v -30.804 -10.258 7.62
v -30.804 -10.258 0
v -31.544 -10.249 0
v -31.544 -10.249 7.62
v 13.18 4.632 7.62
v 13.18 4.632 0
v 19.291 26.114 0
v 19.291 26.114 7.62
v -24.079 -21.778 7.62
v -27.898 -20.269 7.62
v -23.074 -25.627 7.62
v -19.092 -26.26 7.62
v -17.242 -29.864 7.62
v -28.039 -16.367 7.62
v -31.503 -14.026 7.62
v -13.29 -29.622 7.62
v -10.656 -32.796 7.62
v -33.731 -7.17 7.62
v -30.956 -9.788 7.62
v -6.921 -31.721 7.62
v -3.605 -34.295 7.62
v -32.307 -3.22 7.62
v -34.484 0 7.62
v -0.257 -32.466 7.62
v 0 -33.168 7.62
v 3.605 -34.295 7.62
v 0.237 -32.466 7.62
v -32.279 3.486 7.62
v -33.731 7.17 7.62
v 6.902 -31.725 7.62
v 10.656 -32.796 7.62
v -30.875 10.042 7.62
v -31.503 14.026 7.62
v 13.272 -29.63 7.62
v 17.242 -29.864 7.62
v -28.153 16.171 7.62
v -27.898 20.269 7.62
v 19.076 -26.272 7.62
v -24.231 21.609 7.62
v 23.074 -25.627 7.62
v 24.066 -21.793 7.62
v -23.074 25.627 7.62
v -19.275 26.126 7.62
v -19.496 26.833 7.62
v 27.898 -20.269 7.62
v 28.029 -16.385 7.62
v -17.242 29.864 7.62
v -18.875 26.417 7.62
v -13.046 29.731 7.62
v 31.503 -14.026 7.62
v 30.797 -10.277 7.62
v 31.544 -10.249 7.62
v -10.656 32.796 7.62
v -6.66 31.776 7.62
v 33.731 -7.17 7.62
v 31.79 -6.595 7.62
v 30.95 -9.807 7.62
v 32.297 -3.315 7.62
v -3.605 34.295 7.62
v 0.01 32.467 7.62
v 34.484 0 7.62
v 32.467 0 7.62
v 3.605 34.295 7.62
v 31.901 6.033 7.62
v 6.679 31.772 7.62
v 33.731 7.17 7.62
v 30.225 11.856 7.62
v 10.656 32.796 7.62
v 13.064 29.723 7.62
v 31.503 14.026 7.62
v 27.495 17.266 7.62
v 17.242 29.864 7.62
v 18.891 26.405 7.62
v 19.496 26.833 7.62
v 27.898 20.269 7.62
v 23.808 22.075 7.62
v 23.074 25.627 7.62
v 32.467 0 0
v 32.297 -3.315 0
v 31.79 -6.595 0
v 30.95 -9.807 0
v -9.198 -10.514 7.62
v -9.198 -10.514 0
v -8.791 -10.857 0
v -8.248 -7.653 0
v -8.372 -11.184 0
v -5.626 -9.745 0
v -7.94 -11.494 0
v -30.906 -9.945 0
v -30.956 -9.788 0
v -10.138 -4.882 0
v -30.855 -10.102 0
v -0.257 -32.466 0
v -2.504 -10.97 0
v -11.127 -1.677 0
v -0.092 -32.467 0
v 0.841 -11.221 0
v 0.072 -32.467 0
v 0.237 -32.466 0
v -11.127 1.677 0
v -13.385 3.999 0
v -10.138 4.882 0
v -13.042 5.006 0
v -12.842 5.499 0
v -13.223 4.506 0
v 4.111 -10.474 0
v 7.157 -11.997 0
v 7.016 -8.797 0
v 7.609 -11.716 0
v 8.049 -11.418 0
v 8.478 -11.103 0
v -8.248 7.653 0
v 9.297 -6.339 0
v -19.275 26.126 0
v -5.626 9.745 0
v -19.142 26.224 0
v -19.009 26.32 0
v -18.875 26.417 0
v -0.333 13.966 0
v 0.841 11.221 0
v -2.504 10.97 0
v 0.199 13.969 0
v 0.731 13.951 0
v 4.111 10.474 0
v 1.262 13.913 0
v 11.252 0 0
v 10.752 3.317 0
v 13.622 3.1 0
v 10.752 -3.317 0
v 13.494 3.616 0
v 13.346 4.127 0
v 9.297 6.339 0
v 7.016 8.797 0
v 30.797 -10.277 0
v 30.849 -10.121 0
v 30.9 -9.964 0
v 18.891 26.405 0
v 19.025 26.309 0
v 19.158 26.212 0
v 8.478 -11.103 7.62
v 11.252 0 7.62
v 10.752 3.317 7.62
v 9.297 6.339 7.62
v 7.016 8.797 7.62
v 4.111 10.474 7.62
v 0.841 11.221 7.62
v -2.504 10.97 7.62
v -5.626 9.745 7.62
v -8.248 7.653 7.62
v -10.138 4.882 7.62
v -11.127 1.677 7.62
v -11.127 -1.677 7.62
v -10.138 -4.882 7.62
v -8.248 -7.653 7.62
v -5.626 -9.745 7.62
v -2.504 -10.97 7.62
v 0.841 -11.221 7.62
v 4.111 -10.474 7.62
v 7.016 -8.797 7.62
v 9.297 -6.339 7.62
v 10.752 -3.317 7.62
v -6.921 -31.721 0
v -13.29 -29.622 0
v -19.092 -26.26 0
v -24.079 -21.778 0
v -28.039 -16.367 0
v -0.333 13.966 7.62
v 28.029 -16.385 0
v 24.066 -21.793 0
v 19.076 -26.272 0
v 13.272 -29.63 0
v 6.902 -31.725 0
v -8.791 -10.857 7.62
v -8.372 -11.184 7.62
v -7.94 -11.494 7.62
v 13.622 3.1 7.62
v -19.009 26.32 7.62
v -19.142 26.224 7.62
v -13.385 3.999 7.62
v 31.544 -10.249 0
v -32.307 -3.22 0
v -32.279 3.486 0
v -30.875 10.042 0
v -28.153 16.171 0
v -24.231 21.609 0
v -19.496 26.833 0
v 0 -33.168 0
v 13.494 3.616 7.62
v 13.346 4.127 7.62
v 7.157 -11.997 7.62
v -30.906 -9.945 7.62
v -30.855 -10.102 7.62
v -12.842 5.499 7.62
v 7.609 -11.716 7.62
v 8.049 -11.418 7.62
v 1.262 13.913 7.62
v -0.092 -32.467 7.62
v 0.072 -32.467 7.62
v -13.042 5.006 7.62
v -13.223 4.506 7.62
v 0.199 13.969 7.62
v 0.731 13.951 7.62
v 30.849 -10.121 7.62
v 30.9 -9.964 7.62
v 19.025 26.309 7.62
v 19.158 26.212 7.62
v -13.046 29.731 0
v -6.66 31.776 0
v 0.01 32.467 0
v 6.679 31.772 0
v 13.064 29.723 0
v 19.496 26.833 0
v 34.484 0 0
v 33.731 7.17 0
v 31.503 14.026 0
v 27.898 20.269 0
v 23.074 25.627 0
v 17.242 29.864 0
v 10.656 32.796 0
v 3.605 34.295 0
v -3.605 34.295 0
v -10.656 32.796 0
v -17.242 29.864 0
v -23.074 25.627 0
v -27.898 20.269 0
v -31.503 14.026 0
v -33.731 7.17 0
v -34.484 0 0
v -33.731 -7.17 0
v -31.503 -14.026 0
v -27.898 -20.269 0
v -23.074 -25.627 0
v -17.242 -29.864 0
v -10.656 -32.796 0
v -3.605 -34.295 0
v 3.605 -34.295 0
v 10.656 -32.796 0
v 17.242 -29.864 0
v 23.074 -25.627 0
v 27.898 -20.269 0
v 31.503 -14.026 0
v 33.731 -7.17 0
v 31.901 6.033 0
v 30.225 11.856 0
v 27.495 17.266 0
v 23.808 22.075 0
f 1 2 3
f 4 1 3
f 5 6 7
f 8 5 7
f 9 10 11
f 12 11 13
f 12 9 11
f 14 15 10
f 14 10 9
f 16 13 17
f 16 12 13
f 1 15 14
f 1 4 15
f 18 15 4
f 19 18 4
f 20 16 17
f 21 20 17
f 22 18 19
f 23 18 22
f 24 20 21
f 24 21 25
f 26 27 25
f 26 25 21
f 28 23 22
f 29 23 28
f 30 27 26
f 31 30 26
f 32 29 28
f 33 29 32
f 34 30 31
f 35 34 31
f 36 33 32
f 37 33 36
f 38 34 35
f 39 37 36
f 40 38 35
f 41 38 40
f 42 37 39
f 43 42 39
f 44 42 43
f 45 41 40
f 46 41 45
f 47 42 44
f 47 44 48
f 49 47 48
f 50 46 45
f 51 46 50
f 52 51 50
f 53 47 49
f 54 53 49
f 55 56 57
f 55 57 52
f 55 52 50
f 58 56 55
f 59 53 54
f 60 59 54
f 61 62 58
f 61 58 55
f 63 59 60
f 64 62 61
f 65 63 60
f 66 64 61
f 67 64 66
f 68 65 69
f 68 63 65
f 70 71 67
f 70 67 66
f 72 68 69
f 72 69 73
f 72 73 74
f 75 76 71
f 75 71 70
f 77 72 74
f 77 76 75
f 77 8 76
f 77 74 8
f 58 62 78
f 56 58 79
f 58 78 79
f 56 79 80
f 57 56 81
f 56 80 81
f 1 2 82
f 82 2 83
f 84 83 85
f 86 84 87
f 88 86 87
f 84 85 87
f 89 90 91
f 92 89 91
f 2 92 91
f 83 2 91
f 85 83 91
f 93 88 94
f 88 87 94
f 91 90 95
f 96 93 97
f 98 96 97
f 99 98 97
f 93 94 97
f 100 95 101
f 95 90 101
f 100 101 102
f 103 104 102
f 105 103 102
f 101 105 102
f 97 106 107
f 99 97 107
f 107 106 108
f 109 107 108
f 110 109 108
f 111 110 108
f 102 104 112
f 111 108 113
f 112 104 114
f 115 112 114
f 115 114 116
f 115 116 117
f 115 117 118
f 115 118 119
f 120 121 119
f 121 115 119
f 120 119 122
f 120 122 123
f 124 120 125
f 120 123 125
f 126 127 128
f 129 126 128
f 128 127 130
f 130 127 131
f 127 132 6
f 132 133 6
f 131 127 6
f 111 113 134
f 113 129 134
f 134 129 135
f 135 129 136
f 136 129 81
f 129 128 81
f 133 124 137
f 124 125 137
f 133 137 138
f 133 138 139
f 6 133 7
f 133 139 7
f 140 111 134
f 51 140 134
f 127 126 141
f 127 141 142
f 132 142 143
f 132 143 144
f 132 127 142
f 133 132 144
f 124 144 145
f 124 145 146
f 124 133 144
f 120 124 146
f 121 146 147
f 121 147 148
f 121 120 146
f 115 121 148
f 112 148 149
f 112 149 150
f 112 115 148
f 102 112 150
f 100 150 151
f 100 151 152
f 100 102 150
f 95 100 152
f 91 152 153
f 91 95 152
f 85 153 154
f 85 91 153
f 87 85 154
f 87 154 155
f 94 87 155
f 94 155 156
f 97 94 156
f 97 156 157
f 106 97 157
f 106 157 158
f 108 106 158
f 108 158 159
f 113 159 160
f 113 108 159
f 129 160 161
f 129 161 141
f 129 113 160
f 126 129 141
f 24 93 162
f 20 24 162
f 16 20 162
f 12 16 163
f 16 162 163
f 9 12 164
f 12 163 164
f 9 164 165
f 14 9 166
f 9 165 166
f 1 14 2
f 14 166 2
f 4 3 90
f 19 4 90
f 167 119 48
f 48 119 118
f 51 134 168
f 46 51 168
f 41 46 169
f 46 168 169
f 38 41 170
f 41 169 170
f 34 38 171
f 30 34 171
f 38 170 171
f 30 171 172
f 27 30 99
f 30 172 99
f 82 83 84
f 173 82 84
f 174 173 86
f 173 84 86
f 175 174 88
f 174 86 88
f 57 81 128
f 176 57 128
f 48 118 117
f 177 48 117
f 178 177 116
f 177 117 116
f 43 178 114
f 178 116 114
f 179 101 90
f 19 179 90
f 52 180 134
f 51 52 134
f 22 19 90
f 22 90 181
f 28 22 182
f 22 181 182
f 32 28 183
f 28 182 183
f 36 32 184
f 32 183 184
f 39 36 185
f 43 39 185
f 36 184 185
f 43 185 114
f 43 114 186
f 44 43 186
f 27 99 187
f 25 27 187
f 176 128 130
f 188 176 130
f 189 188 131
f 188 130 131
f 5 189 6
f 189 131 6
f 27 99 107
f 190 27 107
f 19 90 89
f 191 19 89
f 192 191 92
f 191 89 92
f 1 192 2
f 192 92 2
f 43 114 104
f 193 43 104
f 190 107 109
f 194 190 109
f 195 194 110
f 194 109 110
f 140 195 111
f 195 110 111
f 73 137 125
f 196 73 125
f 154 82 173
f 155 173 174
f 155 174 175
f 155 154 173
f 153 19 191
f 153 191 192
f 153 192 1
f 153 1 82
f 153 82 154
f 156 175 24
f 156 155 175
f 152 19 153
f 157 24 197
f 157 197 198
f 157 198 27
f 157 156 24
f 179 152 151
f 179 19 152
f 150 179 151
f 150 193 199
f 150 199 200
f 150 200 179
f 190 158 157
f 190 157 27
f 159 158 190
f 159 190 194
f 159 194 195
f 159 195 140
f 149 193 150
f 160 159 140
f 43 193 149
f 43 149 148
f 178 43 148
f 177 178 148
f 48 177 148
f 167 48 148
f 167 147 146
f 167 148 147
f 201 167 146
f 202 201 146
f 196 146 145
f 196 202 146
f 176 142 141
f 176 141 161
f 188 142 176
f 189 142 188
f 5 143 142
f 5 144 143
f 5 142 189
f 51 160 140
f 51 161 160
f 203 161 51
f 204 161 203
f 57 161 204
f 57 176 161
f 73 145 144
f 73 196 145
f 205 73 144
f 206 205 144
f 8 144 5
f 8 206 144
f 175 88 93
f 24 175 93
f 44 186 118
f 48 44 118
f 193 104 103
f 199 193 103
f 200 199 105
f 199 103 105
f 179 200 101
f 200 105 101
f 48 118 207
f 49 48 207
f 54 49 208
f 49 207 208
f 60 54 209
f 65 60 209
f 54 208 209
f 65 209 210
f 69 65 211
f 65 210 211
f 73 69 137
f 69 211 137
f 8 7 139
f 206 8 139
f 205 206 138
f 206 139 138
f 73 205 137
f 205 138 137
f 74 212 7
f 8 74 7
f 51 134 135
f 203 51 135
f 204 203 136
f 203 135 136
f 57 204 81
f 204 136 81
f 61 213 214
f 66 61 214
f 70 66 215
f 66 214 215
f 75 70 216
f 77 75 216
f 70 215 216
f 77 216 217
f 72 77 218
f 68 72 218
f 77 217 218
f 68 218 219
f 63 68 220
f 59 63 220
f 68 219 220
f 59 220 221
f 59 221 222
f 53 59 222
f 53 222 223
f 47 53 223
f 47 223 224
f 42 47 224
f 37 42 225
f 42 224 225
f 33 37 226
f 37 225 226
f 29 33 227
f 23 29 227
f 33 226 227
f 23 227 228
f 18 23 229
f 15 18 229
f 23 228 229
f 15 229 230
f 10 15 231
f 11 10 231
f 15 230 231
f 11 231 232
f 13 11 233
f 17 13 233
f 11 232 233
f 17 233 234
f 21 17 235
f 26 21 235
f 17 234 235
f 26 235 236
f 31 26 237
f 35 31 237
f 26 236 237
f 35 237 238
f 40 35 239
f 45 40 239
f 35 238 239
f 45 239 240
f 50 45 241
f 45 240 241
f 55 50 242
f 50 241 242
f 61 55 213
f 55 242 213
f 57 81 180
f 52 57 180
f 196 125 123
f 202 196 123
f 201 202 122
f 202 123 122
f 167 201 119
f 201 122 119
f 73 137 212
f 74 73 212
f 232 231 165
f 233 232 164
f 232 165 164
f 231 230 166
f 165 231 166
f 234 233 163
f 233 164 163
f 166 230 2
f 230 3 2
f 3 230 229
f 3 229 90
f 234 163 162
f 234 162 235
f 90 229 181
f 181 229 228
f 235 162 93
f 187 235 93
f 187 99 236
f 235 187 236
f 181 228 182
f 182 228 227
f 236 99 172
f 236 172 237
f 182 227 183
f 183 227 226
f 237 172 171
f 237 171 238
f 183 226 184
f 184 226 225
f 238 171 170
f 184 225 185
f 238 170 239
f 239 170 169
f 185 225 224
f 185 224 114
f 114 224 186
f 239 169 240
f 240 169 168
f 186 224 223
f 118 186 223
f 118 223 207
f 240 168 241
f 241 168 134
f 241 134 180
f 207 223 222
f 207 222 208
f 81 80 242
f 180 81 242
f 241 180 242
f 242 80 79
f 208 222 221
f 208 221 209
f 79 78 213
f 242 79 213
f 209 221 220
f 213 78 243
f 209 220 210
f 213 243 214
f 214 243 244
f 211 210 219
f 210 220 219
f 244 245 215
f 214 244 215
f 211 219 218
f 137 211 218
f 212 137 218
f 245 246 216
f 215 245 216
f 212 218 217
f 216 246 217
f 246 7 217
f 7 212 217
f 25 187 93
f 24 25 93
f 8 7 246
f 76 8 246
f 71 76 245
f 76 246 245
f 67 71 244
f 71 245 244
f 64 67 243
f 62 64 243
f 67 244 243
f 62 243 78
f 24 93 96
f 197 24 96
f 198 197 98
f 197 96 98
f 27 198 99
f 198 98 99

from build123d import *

# Parameters (mm, degrees)
F0_R     = 11.2522
F1_DEPTH = 7.62
F0_R_2   = 34.4842316456


with BuildPart() as f1:
    # F0 (on Top) → F1 (new body)
    with BuildSketch(Plane.XY):
        with BuildLine():
            ThreePointArc((-12.8421339688, 5.4991358527), (-7.8305382248, 11.5690782308), (-0.3328787362, 13.9660335009))
            Line((-0.3328787362, 13.9660335009), (-18.8749439971, 26.4165889708))
            ThreePointArc((-18.8749439971, 26.4165889708), (-19.0755199185, 26.2721187494), (-19.2749901009, 26.1261256284))
            Line((-19.2749901009, 26.1261256284), (-12.8421339688, 5.4991358527))
        make_face()
        with BuildLine():
            ThreePointArc((1.2615513463, 13.9129216271), (8.5830778523, 11.0223261874), (13.1796219812, 4.632328187))
            Line((13.1796219812, 4.632328187), (19.2909906159, 26.1143134085))
            ThreePointArc((19.2909906159, 26.1143134085), (19.0916099022, 26.260428692), (18.8911225169, 26.4050217534))
            Line((18.8911225169, 26.4050217534), (1.2615513463, 13.9129216271))
        make_face()
        with BuildLine():
            ThreePointArc((13.6218155794, 3.0995225957), (13.8826810027, 1.5595089541), (13.97, 0))
            ThreePointArc((13.97, 0), (12.5220448234, -6.1934879866), (8.4783330795, -11.1030972343))
            Line((8.4783330795, -11.1030972343), (30.7974318744, -10.2770556914))
            ThreePointArc((30.7974318744, -10.2770556914), (30.874783738, -10.0422812586), (30.950345902, -9.8069247112))
            Line((30.950345902, -9.8069247112), (13.6218155794, 3.0995225957))
        make_face()
        with BuildLine():
            Line((0.2372432141, -32.46603455), (7.1571936703, -11.997311314))
            ThreePointArc((7.1571936703, -11.997311314), (-0.4650950677, -13.962255784), (-7.9397239702, -11.4944196581))
            Line((-7.9397239702, -11.4944196581), (-0.2571309513, -32.4658831301))
            ThreePointArc((-0.2571309513, -32.4658831301), (-0.0099441568, -32.4668998344), (0.2372432141, -32.46603455))
        make_face()
        with BuildLine():
            Line((-30.8037215321, -10.2581881207), (-9.1984266271, -10.5142687613))
            ThreePointArc((-9.1984266271, -10.5142687613), (-13.4226166255, -3.8722426223), (-13.3853523543, 3.9991552046))
            Line((-13.3853523543, 3.9991552046), (-30.9563475419, -9.7879635578))
            ThreePointArc((-30.9563475419, -9.7879635578), (-30.8809295649, -10.0233663484), (-30.8037215321, -10.2581881207))
        make_face()
        with BuildLine():
            ThreePointArc((8.4783330795, -11.1030972343), (12.5220448234, -6.1934879866), (13.97, 0))
            ThreePointArc((13.97, 0), (13.8826810027, 1.5595089541), (13.6218155794, 3.0995225957))
            ThreePointArc((13.6218155794, 3.0995225957), (13.4226166255, 3.8722426223), (13.1796219812, 4.632328187))
            ThreePointArc((13.1796219812, 4.632328187), (8.5830778523, 11.0223261874), (1.2615513463, 13.9129216271))
            ThreePointArc((1.2615513463, 13.9129216271), (0.4650950677, 13.962255784), (-0.3328787362, 13.9660335009))
            ThreePointArc((-0.3328787362, 13.9660335009), (-7.8305382248, 11.5690782308), (-12.8421339688, 5.4991358527))
            ThreePointArc((-12.8421339688, 5.4991358527), (-13.1351720656, 4.7569060119), (-13.3853523543, 3.9991552046))
            ThreePointArc((-13.3853523543, 3.9991552046), (-13.4226166255, -3.8722426223), (-9.1984266271, -10.5142687613))
            ThreePointArc((-9.1984266271, -10.5142687613), (-8.5830778523, -11.0223261874), (-7.9397239702, -11.4944196581))
            ThreePointArc((-7.9397239702, -11.4944196581), (-0.4650950677, -13.962255784), (7.1571936703, -11.997311314))
            ThreePointArc((7.1571936703, -11.997311314), (7.8305382248, -11.5690782308), (8.4783330795, -11.1030972343))
        make_face()
        Circle(F0_R, mode=Mode.SUBTRACT)
    extrude(amount=F1_DEPTH)


with BuildPart() as f1b:
    # F0 (on Top) → F1, piece 2 (new body)
    with BuildSketch(Plane.XY):
        Circle(F0_R_2)
        with BuildLine():
            ThreePointArc((32.4669013573, 0), (32.0855225228, -4.9617464853), (30.950345902, -9.8069247112))
            Line((30.950345902, -9.8069247112), (31.5444363158, -10.2494086656))
            Line((31.5444363158, -10.2494086656), (30.7974318744, -10.2770556914))
            ThreePointArc((30.7974318744, -10.2770556914), (19.0755199185, -26.2721187494), (0.2372432141, -32.46603455))
            Line((0.2372432141, -32.46603455), (0, -33.1677831709))
            Line((0, -33.1677831709), (-0.2571309513, -32.4658831301))
            ThreePointArc((-0.2571309513, -32.4658831301), (-19.0916099022, -26.260428692), (-30.8037215321, -10.2581881207))
            Line((-30.8037215321, -10.2581881207), (-31.5444363158, -10.2494086656))
            Line((-31.5444363158, -10.2494086656), (-30.9563475419, -9.7879635578))
            ThreePointArc((-30.9563475419, -9.7879635578), (-30.874783738, 10.0422812586), (-19.2749901009, 26.1261256284))
            Line((-19.2749901009, 26.1261256284), (-19.4955337991, 26.833300251))
            Line((-19.4955337991, 26.833300251), (-18.8749439971, 26.4165889708))
            ThreePointArc((-18.8749439971, 26.4165889708), (0.0099441568, 32.4668998344), (18.8911225169, 26.4050217534))
            Line((18.8911225169, 26.4050217534), (19.4955337991, 26.833300251))
            Line((19.4955337991, 26.833300251), (19.2909906159, 26.1143134085))
            ThreePointArc((19.2909906159, 26.1143134085), (28.9863620791, 14.6249956296), (32.4669013573, 0))
        make_face(mode=Mode.SUBTRACT)
    extrude(amount=F1_DEPTH)


solid = Compound([f1.part, f1b.part])
